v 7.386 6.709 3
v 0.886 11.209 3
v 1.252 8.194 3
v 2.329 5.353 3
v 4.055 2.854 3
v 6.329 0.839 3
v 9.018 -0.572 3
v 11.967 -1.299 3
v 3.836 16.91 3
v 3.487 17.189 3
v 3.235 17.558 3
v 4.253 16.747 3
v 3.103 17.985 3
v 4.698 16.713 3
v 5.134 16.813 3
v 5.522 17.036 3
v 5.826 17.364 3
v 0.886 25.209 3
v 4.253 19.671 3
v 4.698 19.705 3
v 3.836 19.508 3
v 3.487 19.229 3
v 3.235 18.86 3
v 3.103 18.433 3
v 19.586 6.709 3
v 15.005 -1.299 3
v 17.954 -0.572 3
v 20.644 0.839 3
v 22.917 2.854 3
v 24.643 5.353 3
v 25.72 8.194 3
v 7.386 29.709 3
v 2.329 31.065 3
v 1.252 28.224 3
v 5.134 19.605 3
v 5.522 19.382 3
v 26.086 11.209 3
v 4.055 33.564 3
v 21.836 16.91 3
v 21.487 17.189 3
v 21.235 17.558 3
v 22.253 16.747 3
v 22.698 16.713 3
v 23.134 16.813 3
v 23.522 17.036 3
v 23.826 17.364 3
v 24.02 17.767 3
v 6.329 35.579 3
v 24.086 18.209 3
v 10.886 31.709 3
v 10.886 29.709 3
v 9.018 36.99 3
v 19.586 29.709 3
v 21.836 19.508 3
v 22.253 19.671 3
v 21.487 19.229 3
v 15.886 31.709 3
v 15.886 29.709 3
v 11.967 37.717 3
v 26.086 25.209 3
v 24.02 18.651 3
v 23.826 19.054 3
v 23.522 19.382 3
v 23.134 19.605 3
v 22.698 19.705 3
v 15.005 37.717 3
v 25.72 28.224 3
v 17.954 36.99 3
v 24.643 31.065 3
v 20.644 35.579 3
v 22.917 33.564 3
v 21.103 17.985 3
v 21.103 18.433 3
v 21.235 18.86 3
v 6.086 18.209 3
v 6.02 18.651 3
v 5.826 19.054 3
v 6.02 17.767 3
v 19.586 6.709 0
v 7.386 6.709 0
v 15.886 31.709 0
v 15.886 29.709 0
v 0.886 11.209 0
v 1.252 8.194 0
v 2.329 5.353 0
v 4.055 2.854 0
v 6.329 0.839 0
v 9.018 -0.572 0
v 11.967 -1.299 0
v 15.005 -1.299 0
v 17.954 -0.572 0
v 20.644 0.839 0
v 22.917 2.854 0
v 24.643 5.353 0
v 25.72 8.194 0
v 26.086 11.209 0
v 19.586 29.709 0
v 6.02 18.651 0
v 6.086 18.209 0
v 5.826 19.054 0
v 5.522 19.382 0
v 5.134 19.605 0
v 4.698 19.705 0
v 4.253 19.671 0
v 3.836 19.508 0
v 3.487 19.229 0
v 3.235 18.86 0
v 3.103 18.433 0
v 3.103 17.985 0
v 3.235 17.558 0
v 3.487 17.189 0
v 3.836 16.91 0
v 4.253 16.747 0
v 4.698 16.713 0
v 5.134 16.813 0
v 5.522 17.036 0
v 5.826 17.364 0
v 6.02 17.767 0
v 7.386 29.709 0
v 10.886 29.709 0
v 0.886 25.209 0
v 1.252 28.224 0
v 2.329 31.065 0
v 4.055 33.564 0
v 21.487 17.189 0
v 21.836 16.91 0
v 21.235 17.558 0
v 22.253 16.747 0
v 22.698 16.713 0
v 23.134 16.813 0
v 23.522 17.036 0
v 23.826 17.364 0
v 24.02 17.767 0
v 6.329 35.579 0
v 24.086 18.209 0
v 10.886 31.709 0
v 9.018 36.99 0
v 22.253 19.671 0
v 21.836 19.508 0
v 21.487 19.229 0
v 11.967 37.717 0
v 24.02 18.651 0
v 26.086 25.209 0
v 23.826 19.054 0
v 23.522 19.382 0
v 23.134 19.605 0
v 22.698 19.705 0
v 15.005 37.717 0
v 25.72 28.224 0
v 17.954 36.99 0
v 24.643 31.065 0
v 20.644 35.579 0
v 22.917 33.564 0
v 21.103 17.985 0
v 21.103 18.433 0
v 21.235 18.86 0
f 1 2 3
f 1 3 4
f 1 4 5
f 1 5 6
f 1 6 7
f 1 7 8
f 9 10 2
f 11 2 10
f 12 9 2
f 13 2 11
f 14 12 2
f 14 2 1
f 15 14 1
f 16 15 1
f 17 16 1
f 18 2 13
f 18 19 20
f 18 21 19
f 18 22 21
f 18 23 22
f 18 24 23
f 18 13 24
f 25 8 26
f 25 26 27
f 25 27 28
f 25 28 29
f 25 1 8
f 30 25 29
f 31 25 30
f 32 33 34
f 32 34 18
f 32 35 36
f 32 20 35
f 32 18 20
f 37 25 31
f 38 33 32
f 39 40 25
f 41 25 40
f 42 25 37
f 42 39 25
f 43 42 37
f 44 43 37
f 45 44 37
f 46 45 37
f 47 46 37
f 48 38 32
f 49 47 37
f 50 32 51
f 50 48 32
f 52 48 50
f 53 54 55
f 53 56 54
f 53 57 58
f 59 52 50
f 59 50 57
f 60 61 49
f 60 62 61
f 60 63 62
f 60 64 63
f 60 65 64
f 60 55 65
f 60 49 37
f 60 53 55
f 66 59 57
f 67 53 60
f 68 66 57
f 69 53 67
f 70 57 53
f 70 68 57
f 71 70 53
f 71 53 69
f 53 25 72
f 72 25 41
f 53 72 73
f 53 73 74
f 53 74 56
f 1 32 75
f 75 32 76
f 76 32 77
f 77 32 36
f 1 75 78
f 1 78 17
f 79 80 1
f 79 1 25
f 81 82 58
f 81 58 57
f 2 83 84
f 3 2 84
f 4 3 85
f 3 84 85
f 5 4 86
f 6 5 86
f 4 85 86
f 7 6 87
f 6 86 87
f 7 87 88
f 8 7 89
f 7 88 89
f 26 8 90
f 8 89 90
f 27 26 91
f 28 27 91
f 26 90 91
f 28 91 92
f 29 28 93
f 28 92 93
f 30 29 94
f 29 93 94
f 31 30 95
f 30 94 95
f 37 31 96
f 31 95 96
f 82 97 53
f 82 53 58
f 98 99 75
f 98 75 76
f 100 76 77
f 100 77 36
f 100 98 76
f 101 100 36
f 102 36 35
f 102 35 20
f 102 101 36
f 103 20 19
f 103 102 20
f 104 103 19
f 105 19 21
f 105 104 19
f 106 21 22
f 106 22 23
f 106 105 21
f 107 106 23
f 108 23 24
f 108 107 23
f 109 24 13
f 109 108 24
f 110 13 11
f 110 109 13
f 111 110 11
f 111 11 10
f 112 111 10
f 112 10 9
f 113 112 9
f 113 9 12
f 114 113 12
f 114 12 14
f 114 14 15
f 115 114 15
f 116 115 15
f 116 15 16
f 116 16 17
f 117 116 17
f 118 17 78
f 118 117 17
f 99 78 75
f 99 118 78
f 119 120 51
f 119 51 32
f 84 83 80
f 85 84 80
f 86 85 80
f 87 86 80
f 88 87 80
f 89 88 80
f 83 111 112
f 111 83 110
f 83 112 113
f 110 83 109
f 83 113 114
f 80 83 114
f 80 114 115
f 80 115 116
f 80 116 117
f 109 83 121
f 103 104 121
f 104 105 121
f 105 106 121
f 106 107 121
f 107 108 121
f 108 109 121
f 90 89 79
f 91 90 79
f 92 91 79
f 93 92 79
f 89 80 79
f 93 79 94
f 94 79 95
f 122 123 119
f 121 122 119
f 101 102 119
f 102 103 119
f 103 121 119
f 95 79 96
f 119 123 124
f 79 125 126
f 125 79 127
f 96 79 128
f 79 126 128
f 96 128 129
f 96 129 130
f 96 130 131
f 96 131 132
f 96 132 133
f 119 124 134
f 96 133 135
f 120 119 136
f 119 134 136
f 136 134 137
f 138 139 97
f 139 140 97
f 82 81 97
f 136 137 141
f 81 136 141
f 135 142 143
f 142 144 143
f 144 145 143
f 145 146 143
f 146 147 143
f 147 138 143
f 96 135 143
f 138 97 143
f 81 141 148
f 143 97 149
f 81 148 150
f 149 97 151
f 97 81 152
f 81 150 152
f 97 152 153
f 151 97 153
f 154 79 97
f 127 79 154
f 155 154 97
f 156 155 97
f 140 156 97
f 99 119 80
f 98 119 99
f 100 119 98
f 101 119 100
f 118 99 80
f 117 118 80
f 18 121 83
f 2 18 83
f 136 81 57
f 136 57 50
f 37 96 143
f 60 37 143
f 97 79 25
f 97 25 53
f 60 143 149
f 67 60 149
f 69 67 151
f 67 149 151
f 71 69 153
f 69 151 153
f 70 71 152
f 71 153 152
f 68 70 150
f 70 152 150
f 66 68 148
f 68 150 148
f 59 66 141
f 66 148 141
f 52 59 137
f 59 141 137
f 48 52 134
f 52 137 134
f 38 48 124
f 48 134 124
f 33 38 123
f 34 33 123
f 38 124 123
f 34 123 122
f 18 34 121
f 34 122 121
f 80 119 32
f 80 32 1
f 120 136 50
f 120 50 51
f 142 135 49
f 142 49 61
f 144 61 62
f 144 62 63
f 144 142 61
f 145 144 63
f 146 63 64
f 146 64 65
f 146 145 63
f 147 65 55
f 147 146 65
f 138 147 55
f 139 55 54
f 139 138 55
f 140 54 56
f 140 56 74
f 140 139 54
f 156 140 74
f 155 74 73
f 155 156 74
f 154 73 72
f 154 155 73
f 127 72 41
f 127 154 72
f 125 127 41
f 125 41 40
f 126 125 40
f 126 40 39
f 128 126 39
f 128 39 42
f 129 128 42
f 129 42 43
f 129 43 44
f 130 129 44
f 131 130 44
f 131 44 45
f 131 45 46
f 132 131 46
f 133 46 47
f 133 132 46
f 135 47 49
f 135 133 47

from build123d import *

# Parameters (mm, degrees)
MODEL_R             = 1.5
BOSS_EXTRUDE1_DEPTH = 3


with BuildPart() as part:
    # Model → Boss-Extrude1 (new body)
    with BuildSketch(Plane.XY):
        with BuildLine():
            Line((0.88624, 25.209039561), (0.88624, 11.208991882))
            ThreePointArc((0.88624, 11.208991882), (13.486238839, -1.391009279), (26.08624, 11.20898956))
            Line((26.08624, 11.20898956), (26.08624, 25.209041884))
            ThreePointArc((26.08624, 25.209041884), (13.486238839, 37.809039561), (0.88624, 25.209039561))
        make_face()
        with Locations((4.586289997, 18.209039557)):
            Circle(MODEL_R, mode=Mode.SUBTRACT)
        with Locations((22.586289997, 18.209039557)):
            Circle(MODEL_R, mode=Mode.SUBTRACT)
        Polygon((19.586238839, 6.708989561), (19.586238839, 29.708989561), (15.886238839, 29.708989561), (15.886238839, 31.708989561), (10.886238839, 31.708989561), (10.886238839, 29.708989561), (7.386238839, 29.708989561), (7.386238839, 6.708989561), align=None, mode=Mode.SUBTRACT)
    extrude(amount=BOSS_EXTRUDE1_DEPTH)


solid = part.part
